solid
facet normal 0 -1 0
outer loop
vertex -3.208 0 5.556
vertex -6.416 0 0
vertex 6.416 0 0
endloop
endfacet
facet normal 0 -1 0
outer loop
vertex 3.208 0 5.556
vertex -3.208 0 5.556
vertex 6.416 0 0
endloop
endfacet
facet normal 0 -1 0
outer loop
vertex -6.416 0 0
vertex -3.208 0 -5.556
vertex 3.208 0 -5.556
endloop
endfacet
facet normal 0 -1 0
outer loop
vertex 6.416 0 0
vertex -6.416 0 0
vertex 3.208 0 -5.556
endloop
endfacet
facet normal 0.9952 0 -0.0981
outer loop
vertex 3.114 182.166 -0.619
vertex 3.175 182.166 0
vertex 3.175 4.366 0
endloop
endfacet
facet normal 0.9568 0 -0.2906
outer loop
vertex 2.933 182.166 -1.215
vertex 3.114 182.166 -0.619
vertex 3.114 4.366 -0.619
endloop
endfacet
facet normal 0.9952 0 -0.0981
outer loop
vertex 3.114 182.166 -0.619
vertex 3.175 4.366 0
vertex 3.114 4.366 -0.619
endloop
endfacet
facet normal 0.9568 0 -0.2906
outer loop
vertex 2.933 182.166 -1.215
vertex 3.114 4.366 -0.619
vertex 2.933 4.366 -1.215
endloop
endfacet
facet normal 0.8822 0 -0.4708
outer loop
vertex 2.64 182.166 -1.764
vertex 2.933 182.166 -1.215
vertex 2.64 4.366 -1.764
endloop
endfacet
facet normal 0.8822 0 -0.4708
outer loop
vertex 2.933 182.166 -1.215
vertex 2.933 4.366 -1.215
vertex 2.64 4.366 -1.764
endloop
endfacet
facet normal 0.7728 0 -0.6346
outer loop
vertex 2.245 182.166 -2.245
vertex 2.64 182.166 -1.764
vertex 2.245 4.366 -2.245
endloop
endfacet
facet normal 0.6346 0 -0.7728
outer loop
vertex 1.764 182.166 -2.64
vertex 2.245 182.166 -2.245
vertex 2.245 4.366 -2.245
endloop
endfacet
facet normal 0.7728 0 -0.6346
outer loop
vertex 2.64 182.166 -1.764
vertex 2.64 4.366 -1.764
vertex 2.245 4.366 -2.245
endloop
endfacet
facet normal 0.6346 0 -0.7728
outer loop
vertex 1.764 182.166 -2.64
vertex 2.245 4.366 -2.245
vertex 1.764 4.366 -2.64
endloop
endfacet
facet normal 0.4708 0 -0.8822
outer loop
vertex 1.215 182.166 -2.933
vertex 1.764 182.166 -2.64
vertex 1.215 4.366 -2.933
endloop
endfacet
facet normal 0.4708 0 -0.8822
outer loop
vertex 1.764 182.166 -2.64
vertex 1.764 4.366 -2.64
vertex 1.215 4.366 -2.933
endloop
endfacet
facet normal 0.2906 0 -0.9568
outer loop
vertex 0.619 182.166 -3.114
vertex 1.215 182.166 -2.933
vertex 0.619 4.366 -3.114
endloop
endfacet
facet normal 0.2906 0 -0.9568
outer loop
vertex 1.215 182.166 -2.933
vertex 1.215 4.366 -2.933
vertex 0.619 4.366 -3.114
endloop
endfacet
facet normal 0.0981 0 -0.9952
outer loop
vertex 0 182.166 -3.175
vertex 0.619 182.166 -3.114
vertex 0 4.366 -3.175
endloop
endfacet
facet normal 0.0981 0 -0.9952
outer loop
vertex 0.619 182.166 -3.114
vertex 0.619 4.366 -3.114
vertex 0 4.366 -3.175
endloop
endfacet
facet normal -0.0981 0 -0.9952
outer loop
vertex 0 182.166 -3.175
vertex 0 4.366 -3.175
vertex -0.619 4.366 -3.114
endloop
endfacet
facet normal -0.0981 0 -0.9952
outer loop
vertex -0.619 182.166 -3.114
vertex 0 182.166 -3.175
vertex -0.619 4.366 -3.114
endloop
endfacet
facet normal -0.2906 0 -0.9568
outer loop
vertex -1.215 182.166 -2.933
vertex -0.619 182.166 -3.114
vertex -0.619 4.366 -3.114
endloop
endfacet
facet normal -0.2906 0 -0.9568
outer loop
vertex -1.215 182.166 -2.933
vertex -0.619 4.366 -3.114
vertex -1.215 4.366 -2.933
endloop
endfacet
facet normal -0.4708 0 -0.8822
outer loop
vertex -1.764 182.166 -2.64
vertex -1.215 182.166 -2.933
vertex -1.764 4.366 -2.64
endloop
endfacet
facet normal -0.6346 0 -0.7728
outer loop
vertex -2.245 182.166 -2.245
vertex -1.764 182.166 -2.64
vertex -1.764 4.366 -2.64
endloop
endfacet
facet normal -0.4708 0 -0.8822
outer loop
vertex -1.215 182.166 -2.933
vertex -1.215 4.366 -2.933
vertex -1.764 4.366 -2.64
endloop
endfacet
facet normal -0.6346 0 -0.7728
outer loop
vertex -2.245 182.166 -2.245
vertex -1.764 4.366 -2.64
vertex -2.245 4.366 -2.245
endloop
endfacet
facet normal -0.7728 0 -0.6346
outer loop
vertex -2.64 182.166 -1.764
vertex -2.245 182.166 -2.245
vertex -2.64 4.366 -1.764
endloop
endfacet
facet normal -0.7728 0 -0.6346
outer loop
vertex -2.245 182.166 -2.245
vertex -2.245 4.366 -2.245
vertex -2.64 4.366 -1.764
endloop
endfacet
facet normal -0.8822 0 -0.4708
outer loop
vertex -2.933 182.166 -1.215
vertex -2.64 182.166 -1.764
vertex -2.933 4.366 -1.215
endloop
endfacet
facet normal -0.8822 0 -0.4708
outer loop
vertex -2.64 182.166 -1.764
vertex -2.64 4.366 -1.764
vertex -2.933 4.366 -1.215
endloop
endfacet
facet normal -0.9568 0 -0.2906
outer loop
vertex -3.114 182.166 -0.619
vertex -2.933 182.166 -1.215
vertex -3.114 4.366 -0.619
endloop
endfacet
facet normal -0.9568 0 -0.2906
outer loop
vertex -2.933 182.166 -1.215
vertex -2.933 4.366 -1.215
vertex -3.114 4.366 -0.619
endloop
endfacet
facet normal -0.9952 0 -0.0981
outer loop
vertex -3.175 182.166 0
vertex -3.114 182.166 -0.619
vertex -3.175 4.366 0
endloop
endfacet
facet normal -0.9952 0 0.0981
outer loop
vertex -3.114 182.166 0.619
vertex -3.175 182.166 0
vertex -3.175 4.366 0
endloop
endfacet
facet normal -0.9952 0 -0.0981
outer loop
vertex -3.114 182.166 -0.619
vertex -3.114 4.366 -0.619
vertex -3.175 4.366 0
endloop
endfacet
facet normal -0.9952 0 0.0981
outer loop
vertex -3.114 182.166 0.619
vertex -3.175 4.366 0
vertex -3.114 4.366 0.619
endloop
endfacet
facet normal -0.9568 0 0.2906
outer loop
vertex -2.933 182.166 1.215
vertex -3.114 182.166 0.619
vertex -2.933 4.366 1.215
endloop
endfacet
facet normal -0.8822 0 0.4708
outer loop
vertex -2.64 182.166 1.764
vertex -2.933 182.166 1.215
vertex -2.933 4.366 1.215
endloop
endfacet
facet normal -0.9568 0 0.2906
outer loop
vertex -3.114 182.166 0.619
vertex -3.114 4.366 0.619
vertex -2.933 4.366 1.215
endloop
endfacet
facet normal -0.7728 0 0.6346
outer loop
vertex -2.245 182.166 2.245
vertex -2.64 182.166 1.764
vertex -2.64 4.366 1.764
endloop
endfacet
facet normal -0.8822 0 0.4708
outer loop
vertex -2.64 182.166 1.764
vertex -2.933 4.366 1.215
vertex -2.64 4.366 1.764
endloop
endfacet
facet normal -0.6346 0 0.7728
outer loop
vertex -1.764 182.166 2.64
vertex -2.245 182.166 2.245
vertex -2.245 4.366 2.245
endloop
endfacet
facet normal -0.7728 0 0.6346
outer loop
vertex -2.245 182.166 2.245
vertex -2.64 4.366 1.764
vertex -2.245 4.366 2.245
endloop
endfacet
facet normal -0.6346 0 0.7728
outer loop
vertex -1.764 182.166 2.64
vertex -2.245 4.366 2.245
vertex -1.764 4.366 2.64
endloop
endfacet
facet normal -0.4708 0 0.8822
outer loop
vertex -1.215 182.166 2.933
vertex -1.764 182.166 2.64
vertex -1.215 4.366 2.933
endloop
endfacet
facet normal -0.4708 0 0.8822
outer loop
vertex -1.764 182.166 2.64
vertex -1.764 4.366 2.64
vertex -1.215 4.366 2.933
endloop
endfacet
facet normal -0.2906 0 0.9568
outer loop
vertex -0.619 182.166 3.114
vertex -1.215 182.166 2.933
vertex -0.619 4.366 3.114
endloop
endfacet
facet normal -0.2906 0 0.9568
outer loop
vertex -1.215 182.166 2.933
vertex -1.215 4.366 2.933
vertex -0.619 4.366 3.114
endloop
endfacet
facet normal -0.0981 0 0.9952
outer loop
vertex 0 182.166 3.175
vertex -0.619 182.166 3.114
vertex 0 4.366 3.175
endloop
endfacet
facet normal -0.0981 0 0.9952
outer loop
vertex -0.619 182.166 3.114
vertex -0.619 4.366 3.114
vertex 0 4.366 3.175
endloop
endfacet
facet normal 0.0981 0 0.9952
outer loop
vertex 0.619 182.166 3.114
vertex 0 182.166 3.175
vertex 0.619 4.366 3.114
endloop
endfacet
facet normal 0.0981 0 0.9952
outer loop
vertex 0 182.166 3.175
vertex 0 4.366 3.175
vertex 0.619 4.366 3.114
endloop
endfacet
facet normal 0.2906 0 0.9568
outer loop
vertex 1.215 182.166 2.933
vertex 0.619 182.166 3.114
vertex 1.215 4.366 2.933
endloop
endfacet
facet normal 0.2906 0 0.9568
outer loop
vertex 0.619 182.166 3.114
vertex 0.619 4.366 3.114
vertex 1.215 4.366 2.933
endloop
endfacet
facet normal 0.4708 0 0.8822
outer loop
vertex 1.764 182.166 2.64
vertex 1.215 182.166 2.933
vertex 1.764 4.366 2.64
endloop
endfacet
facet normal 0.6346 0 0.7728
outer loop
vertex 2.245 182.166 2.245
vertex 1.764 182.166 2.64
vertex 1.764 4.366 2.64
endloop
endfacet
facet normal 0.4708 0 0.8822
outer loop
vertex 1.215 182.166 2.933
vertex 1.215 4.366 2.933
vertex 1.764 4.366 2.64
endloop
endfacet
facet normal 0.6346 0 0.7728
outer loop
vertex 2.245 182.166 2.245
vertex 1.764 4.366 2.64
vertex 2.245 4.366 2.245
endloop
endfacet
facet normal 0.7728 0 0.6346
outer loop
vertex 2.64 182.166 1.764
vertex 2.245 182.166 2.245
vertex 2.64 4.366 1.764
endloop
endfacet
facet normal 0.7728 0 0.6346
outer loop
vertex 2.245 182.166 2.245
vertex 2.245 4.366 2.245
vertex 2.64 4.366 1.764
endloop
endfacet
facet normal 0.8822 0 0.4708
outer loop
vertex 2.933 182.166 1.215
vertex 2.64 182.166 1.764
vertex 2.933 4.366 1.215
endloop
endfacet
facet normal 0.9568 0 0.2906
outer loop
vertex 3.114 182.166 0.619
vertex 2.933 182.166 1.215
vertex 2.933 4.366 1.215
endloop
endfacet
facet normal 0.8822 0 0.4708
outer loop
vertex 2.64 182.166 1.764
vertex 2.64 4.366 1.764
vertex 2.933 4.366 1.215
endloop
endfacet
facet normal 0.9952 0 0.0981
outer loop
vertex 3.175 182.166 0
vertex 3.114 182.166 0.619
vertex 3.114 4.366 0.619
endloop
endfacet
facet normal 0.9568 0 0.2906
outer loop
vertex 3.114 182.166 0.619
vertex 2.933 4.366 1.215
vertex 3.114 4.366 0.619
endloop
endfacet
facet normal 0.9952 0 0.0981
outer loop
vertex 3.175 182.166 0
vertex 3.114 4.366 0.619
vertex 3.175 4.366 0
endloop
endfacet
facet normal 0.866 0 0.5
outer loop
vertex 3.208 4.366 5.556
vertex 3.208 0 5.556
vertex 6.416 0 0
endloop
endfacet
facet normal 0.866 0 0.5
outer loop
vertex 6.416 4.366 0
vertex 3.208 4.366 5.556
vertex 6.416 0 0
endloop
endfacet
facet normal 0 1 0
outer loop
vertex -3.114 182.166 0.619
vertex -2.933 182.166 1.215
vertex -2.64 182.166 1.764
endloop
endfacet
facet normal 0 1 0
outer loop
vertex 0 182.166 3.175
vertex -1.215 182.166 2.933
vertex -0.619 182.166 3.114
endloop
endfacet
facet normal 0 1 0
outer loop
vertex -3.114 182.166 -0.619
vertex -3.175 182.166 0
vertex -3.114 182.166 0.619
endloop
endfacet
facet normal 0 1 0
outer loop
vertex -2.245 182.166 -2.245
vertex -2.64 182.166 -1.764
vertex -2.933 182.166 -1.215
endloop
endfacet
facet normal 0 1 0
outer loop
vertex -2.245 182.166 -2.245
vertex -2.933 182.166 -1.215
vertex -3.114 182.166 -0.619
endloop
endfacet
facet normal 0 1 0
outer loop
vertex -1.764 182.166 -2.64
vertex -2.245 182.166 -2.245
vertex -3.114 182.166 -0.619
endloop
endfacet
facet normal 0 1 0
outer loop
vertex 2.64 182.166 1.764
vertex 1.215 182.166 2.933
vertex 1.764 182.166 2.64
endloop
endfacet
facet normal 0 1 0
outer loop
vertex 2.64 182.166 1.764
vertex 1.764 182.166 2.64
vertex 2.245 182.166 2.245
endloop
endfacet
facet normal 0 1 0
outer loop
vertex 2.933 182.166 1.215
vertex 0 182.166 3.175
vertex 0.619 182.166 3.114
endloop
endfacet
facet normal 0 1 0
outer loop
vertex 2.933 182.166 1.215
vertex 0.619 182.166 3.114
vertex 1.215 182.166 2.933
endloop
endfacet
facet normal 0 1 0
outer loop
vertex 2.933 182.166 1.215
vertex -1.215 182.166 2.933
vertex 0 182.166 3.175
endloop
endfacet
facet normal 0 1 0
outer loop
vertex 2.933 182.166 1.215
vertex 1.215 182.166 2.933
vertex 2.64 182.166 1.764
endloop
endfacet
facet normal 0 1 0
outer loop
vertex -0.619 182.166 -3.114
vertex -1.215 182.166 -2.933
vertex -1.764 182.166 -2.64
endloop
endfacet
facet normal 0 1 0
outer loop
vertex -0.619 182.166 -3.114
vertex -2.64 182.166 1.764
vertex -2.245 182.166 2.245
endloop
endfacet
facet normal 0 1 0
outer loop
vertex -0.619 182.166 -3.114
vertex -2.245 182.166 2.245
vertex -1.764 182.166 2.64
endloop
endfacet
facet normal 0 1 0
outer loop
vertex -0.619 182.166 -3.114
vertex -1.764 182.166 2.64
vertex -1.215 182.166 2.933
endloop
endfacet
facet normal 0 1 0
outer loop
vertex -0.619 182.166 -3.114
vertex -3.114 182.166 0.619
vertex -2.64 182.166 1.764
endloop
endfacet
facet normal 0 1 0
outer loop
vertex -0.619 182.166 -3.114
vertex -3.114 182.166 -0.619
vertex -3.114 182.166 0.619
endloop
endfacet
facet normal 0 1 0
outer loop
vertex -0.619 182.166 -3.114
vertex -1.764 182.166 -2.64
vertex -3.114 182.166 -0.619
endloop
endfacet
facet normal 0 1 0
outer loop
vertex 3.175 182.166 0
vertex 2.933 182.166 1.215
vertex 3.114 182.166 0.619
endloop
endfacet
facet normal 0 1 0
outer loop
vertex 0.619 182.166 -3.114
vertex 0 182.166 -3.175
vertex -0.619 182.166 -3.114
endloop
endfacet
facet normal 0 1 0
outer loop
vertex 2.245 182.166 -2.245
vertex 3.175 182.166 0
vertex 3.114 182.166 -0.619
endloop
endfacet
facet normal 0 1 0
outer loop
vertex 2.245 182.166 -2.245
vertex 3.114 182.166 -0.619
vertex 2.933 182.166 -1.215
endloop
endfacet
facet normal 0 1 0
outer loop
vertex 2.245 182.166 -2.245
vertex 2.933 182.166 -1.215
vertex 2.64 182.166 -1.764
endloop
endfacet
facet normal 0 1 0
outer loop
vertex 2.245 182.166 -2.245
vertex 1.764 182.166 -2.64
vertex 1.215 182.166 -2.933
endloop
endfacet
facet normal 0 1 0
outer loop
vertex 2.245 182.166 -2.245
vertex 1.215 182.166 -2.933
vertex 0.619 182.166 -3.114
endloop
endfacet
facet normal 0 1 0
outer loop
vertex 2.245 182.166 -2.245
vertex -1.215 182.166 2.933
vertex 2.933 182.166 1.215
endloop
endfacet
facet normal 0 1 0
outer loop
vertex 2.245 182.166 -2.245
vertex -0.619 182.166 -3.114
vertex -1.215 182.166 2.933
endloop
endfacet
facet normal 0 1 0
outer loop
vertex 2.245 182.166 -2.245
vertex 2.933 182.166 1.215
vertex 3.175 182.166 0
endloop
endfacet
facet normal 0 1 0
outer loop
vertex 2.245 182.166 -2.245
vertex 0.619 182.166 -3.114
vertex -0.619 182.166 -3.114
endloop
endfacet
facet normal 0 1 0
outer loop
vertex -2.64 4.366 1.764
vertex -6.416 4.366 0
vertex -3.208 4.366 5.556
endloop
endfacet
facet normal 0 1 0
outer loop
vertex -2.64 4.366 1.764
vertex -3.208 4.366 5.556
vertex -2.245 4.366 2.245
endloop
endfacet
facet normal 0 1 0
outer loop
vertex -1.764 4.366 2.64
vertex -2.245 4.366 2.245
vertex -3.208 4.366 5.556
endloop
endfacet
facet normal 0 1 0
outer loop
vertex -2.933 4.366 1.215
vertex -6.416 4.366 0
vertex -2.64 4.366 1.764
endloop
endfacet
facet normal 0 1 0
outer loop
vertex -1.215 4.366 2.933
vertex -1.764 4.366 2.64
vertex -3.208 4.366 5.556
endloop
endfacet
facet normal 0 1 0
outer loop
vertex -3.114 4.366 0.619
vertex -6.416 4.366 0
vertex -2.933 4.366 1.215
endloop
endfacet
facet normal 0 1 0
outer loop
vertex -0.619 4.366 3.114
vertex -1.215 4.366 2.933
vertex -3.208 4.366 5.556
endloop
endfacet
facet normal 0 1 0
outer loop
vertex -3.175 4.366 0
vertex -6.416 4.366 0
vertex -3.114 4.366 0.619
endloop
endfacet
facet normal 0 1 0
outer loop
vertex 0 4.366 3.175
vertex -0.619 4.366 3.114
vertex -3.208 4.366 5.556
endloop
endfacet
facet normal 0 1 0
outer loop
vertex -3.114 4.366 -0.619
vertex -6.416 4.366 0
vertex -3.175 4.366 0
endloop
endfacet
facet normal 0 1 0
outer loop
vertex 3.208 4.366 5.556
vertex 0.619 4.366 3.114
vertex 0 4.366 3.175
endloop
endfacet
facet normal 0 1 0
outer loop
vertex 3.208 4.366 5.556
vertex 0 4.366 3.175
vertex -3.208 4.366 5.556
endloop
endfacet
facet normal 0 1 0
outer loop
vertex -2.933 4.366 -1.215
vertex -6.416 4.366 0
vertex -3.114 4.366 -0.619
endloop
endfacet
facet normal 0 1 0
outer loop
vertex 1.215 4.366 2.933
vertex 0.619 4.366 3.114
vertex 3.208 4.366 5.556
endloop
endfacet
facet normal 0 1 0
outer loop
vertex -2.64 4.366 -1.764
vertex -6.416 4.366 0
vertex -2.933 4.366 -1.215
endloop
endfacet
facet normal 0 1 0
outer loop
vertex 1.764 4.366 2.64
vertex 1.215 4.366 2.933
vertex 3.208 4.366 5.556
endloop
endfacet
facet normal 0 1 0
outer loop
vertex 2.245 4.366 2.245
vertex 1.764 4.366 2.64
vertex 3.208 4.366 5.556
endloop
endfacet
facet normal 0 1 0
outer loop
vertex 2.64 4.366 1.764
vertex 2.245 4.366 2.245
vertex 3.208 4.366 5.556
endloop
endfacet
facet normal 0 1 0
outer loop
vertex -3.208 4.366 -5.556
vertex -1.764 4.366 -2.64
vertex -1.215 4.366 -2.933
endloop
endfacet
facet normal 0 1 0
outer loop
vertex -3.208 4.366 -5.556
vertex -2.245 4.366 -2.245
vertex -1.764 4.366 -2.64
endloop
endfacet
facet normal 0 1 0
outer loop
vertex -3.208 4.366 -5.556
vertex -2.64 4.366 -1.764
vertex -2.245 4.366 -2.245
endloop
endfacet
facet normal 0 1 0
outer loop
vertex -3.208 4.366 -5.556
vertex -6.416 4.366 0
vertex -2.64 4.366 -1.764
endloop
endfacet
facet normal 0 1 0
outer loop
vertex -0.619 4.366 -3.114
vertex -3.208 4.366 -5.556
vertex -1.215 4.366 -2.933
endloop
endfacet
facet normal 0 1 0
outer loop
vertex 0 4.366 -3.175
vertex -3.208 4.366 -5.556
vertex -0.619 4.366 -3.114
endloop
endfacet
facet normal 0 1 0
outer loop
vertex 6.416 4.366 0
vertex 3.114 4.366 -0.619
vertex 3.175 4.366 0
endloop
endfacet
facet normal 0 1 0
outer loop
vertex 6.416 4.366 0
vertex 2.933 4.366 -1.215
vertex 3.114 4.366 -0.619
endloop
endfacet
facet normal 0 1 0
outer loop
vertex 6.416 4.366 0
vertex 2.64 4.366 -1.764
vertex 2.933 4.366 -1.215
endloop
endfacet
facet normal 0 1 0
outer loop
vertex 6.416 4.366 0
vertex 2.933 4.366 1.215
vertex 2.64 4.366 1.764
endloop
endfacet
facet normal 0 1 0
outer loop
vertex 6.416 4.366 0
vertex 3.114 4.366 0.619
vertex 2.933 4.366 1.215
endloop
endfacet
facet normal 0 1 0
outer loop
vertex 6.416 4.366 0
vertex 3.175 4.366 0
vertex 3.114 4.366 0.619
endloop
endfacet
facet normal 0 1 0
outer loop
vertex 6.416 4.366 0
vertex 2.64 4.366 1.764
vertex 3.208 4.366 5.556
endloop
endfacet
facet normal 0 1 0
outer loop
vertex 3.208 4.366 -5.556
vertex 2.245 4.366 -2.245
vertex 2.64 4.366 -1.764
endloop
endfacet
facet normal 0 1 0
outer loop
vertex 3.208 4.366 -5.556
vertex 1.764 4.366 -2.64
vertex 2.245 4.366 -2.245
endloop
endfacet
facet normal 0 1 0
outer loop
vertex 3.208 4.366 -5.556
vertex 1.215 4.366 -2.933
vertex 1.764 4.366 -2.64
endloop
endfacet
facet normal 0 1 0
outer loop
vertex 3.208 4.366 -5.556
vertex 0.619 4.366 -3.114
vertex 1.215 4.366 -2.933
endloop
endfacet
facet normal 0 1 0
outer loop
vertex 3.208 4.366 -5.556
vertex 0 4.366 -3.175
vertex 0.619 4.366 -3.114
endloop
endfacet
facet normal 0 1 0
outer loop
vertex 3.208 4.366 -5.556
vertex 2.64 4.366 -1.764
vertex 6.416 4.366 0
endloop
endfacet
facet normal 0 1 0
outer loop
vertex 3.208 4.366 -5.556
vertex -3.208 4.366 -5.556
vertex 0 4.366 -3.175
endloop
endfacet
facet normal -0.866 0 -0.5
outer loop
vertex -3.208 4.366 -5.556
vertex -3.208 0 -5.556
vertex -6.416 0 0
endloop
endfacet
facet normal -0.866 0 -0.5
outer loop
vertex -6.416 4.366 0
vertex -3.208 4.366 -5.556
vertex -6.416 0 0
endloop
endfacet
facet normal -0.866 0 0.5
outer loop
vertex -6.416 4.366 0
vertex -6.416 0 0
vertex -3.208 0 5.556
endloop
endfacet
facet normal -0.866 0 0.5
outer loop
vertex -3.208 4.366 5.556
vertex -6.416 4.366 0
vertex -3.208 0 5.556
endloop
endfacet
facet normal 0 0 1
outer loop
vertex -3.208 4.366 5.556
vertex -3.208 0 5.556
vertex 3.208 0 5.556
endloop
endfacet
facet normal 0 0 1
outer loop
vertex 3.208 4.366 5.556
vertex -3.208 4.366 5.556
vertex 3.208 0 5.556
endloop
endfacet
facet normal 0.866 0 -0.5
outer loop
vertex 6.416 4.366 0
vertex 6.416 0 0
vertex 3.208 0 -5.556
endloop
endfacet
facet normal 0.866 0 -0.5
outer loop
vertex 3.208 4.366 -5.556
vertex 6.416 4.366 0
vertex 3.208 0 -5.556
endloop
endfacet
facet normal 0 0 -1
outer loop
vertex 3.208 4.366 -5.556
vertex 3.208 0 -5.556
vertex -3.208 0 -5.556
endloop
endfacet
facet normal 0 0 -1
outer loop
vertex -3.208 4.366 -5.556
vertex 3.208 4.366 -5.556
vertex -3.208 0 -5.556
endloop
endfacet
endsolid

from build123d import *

# Parameters (mm, degrees)
BOSS_EXTRUDE1_DEPTH = 4.365625
SKETCH2_R           = 3.175
BOSS_EXTRUDE2_DEPTH = 177.8


with BuildPart() as part:
    # Sketch1 → Boss-Extrude1 (new body)
    with BuildSketch(Plane(origin=(0, 0, 0), x_dir=(1, 0, 0), z_dir=(0, 1, 0))):
        Polygon((6.415804866, 0), (3.207902433, 5.55625), (-3.207902433, 5.55625), (-6.415804866, 0), (-3.207902433, -5.55625), (3.207902433, -5.55625), align=None)
    extrude(amount=BOSS_EXTRUDE1_DEPTH)

    # Sketch2 → Boss-Extrude2 (add)
    with BuildSketch(Plane(origin=(0, 4.365625, 0), x_dir=(1, 0, 0), z_dir=(0, 1, 0))):
        Circle(SKETCH2_R)
    extrude(amount=BOSS_EXTRUDE2_DEPTH)


solid = part.part
